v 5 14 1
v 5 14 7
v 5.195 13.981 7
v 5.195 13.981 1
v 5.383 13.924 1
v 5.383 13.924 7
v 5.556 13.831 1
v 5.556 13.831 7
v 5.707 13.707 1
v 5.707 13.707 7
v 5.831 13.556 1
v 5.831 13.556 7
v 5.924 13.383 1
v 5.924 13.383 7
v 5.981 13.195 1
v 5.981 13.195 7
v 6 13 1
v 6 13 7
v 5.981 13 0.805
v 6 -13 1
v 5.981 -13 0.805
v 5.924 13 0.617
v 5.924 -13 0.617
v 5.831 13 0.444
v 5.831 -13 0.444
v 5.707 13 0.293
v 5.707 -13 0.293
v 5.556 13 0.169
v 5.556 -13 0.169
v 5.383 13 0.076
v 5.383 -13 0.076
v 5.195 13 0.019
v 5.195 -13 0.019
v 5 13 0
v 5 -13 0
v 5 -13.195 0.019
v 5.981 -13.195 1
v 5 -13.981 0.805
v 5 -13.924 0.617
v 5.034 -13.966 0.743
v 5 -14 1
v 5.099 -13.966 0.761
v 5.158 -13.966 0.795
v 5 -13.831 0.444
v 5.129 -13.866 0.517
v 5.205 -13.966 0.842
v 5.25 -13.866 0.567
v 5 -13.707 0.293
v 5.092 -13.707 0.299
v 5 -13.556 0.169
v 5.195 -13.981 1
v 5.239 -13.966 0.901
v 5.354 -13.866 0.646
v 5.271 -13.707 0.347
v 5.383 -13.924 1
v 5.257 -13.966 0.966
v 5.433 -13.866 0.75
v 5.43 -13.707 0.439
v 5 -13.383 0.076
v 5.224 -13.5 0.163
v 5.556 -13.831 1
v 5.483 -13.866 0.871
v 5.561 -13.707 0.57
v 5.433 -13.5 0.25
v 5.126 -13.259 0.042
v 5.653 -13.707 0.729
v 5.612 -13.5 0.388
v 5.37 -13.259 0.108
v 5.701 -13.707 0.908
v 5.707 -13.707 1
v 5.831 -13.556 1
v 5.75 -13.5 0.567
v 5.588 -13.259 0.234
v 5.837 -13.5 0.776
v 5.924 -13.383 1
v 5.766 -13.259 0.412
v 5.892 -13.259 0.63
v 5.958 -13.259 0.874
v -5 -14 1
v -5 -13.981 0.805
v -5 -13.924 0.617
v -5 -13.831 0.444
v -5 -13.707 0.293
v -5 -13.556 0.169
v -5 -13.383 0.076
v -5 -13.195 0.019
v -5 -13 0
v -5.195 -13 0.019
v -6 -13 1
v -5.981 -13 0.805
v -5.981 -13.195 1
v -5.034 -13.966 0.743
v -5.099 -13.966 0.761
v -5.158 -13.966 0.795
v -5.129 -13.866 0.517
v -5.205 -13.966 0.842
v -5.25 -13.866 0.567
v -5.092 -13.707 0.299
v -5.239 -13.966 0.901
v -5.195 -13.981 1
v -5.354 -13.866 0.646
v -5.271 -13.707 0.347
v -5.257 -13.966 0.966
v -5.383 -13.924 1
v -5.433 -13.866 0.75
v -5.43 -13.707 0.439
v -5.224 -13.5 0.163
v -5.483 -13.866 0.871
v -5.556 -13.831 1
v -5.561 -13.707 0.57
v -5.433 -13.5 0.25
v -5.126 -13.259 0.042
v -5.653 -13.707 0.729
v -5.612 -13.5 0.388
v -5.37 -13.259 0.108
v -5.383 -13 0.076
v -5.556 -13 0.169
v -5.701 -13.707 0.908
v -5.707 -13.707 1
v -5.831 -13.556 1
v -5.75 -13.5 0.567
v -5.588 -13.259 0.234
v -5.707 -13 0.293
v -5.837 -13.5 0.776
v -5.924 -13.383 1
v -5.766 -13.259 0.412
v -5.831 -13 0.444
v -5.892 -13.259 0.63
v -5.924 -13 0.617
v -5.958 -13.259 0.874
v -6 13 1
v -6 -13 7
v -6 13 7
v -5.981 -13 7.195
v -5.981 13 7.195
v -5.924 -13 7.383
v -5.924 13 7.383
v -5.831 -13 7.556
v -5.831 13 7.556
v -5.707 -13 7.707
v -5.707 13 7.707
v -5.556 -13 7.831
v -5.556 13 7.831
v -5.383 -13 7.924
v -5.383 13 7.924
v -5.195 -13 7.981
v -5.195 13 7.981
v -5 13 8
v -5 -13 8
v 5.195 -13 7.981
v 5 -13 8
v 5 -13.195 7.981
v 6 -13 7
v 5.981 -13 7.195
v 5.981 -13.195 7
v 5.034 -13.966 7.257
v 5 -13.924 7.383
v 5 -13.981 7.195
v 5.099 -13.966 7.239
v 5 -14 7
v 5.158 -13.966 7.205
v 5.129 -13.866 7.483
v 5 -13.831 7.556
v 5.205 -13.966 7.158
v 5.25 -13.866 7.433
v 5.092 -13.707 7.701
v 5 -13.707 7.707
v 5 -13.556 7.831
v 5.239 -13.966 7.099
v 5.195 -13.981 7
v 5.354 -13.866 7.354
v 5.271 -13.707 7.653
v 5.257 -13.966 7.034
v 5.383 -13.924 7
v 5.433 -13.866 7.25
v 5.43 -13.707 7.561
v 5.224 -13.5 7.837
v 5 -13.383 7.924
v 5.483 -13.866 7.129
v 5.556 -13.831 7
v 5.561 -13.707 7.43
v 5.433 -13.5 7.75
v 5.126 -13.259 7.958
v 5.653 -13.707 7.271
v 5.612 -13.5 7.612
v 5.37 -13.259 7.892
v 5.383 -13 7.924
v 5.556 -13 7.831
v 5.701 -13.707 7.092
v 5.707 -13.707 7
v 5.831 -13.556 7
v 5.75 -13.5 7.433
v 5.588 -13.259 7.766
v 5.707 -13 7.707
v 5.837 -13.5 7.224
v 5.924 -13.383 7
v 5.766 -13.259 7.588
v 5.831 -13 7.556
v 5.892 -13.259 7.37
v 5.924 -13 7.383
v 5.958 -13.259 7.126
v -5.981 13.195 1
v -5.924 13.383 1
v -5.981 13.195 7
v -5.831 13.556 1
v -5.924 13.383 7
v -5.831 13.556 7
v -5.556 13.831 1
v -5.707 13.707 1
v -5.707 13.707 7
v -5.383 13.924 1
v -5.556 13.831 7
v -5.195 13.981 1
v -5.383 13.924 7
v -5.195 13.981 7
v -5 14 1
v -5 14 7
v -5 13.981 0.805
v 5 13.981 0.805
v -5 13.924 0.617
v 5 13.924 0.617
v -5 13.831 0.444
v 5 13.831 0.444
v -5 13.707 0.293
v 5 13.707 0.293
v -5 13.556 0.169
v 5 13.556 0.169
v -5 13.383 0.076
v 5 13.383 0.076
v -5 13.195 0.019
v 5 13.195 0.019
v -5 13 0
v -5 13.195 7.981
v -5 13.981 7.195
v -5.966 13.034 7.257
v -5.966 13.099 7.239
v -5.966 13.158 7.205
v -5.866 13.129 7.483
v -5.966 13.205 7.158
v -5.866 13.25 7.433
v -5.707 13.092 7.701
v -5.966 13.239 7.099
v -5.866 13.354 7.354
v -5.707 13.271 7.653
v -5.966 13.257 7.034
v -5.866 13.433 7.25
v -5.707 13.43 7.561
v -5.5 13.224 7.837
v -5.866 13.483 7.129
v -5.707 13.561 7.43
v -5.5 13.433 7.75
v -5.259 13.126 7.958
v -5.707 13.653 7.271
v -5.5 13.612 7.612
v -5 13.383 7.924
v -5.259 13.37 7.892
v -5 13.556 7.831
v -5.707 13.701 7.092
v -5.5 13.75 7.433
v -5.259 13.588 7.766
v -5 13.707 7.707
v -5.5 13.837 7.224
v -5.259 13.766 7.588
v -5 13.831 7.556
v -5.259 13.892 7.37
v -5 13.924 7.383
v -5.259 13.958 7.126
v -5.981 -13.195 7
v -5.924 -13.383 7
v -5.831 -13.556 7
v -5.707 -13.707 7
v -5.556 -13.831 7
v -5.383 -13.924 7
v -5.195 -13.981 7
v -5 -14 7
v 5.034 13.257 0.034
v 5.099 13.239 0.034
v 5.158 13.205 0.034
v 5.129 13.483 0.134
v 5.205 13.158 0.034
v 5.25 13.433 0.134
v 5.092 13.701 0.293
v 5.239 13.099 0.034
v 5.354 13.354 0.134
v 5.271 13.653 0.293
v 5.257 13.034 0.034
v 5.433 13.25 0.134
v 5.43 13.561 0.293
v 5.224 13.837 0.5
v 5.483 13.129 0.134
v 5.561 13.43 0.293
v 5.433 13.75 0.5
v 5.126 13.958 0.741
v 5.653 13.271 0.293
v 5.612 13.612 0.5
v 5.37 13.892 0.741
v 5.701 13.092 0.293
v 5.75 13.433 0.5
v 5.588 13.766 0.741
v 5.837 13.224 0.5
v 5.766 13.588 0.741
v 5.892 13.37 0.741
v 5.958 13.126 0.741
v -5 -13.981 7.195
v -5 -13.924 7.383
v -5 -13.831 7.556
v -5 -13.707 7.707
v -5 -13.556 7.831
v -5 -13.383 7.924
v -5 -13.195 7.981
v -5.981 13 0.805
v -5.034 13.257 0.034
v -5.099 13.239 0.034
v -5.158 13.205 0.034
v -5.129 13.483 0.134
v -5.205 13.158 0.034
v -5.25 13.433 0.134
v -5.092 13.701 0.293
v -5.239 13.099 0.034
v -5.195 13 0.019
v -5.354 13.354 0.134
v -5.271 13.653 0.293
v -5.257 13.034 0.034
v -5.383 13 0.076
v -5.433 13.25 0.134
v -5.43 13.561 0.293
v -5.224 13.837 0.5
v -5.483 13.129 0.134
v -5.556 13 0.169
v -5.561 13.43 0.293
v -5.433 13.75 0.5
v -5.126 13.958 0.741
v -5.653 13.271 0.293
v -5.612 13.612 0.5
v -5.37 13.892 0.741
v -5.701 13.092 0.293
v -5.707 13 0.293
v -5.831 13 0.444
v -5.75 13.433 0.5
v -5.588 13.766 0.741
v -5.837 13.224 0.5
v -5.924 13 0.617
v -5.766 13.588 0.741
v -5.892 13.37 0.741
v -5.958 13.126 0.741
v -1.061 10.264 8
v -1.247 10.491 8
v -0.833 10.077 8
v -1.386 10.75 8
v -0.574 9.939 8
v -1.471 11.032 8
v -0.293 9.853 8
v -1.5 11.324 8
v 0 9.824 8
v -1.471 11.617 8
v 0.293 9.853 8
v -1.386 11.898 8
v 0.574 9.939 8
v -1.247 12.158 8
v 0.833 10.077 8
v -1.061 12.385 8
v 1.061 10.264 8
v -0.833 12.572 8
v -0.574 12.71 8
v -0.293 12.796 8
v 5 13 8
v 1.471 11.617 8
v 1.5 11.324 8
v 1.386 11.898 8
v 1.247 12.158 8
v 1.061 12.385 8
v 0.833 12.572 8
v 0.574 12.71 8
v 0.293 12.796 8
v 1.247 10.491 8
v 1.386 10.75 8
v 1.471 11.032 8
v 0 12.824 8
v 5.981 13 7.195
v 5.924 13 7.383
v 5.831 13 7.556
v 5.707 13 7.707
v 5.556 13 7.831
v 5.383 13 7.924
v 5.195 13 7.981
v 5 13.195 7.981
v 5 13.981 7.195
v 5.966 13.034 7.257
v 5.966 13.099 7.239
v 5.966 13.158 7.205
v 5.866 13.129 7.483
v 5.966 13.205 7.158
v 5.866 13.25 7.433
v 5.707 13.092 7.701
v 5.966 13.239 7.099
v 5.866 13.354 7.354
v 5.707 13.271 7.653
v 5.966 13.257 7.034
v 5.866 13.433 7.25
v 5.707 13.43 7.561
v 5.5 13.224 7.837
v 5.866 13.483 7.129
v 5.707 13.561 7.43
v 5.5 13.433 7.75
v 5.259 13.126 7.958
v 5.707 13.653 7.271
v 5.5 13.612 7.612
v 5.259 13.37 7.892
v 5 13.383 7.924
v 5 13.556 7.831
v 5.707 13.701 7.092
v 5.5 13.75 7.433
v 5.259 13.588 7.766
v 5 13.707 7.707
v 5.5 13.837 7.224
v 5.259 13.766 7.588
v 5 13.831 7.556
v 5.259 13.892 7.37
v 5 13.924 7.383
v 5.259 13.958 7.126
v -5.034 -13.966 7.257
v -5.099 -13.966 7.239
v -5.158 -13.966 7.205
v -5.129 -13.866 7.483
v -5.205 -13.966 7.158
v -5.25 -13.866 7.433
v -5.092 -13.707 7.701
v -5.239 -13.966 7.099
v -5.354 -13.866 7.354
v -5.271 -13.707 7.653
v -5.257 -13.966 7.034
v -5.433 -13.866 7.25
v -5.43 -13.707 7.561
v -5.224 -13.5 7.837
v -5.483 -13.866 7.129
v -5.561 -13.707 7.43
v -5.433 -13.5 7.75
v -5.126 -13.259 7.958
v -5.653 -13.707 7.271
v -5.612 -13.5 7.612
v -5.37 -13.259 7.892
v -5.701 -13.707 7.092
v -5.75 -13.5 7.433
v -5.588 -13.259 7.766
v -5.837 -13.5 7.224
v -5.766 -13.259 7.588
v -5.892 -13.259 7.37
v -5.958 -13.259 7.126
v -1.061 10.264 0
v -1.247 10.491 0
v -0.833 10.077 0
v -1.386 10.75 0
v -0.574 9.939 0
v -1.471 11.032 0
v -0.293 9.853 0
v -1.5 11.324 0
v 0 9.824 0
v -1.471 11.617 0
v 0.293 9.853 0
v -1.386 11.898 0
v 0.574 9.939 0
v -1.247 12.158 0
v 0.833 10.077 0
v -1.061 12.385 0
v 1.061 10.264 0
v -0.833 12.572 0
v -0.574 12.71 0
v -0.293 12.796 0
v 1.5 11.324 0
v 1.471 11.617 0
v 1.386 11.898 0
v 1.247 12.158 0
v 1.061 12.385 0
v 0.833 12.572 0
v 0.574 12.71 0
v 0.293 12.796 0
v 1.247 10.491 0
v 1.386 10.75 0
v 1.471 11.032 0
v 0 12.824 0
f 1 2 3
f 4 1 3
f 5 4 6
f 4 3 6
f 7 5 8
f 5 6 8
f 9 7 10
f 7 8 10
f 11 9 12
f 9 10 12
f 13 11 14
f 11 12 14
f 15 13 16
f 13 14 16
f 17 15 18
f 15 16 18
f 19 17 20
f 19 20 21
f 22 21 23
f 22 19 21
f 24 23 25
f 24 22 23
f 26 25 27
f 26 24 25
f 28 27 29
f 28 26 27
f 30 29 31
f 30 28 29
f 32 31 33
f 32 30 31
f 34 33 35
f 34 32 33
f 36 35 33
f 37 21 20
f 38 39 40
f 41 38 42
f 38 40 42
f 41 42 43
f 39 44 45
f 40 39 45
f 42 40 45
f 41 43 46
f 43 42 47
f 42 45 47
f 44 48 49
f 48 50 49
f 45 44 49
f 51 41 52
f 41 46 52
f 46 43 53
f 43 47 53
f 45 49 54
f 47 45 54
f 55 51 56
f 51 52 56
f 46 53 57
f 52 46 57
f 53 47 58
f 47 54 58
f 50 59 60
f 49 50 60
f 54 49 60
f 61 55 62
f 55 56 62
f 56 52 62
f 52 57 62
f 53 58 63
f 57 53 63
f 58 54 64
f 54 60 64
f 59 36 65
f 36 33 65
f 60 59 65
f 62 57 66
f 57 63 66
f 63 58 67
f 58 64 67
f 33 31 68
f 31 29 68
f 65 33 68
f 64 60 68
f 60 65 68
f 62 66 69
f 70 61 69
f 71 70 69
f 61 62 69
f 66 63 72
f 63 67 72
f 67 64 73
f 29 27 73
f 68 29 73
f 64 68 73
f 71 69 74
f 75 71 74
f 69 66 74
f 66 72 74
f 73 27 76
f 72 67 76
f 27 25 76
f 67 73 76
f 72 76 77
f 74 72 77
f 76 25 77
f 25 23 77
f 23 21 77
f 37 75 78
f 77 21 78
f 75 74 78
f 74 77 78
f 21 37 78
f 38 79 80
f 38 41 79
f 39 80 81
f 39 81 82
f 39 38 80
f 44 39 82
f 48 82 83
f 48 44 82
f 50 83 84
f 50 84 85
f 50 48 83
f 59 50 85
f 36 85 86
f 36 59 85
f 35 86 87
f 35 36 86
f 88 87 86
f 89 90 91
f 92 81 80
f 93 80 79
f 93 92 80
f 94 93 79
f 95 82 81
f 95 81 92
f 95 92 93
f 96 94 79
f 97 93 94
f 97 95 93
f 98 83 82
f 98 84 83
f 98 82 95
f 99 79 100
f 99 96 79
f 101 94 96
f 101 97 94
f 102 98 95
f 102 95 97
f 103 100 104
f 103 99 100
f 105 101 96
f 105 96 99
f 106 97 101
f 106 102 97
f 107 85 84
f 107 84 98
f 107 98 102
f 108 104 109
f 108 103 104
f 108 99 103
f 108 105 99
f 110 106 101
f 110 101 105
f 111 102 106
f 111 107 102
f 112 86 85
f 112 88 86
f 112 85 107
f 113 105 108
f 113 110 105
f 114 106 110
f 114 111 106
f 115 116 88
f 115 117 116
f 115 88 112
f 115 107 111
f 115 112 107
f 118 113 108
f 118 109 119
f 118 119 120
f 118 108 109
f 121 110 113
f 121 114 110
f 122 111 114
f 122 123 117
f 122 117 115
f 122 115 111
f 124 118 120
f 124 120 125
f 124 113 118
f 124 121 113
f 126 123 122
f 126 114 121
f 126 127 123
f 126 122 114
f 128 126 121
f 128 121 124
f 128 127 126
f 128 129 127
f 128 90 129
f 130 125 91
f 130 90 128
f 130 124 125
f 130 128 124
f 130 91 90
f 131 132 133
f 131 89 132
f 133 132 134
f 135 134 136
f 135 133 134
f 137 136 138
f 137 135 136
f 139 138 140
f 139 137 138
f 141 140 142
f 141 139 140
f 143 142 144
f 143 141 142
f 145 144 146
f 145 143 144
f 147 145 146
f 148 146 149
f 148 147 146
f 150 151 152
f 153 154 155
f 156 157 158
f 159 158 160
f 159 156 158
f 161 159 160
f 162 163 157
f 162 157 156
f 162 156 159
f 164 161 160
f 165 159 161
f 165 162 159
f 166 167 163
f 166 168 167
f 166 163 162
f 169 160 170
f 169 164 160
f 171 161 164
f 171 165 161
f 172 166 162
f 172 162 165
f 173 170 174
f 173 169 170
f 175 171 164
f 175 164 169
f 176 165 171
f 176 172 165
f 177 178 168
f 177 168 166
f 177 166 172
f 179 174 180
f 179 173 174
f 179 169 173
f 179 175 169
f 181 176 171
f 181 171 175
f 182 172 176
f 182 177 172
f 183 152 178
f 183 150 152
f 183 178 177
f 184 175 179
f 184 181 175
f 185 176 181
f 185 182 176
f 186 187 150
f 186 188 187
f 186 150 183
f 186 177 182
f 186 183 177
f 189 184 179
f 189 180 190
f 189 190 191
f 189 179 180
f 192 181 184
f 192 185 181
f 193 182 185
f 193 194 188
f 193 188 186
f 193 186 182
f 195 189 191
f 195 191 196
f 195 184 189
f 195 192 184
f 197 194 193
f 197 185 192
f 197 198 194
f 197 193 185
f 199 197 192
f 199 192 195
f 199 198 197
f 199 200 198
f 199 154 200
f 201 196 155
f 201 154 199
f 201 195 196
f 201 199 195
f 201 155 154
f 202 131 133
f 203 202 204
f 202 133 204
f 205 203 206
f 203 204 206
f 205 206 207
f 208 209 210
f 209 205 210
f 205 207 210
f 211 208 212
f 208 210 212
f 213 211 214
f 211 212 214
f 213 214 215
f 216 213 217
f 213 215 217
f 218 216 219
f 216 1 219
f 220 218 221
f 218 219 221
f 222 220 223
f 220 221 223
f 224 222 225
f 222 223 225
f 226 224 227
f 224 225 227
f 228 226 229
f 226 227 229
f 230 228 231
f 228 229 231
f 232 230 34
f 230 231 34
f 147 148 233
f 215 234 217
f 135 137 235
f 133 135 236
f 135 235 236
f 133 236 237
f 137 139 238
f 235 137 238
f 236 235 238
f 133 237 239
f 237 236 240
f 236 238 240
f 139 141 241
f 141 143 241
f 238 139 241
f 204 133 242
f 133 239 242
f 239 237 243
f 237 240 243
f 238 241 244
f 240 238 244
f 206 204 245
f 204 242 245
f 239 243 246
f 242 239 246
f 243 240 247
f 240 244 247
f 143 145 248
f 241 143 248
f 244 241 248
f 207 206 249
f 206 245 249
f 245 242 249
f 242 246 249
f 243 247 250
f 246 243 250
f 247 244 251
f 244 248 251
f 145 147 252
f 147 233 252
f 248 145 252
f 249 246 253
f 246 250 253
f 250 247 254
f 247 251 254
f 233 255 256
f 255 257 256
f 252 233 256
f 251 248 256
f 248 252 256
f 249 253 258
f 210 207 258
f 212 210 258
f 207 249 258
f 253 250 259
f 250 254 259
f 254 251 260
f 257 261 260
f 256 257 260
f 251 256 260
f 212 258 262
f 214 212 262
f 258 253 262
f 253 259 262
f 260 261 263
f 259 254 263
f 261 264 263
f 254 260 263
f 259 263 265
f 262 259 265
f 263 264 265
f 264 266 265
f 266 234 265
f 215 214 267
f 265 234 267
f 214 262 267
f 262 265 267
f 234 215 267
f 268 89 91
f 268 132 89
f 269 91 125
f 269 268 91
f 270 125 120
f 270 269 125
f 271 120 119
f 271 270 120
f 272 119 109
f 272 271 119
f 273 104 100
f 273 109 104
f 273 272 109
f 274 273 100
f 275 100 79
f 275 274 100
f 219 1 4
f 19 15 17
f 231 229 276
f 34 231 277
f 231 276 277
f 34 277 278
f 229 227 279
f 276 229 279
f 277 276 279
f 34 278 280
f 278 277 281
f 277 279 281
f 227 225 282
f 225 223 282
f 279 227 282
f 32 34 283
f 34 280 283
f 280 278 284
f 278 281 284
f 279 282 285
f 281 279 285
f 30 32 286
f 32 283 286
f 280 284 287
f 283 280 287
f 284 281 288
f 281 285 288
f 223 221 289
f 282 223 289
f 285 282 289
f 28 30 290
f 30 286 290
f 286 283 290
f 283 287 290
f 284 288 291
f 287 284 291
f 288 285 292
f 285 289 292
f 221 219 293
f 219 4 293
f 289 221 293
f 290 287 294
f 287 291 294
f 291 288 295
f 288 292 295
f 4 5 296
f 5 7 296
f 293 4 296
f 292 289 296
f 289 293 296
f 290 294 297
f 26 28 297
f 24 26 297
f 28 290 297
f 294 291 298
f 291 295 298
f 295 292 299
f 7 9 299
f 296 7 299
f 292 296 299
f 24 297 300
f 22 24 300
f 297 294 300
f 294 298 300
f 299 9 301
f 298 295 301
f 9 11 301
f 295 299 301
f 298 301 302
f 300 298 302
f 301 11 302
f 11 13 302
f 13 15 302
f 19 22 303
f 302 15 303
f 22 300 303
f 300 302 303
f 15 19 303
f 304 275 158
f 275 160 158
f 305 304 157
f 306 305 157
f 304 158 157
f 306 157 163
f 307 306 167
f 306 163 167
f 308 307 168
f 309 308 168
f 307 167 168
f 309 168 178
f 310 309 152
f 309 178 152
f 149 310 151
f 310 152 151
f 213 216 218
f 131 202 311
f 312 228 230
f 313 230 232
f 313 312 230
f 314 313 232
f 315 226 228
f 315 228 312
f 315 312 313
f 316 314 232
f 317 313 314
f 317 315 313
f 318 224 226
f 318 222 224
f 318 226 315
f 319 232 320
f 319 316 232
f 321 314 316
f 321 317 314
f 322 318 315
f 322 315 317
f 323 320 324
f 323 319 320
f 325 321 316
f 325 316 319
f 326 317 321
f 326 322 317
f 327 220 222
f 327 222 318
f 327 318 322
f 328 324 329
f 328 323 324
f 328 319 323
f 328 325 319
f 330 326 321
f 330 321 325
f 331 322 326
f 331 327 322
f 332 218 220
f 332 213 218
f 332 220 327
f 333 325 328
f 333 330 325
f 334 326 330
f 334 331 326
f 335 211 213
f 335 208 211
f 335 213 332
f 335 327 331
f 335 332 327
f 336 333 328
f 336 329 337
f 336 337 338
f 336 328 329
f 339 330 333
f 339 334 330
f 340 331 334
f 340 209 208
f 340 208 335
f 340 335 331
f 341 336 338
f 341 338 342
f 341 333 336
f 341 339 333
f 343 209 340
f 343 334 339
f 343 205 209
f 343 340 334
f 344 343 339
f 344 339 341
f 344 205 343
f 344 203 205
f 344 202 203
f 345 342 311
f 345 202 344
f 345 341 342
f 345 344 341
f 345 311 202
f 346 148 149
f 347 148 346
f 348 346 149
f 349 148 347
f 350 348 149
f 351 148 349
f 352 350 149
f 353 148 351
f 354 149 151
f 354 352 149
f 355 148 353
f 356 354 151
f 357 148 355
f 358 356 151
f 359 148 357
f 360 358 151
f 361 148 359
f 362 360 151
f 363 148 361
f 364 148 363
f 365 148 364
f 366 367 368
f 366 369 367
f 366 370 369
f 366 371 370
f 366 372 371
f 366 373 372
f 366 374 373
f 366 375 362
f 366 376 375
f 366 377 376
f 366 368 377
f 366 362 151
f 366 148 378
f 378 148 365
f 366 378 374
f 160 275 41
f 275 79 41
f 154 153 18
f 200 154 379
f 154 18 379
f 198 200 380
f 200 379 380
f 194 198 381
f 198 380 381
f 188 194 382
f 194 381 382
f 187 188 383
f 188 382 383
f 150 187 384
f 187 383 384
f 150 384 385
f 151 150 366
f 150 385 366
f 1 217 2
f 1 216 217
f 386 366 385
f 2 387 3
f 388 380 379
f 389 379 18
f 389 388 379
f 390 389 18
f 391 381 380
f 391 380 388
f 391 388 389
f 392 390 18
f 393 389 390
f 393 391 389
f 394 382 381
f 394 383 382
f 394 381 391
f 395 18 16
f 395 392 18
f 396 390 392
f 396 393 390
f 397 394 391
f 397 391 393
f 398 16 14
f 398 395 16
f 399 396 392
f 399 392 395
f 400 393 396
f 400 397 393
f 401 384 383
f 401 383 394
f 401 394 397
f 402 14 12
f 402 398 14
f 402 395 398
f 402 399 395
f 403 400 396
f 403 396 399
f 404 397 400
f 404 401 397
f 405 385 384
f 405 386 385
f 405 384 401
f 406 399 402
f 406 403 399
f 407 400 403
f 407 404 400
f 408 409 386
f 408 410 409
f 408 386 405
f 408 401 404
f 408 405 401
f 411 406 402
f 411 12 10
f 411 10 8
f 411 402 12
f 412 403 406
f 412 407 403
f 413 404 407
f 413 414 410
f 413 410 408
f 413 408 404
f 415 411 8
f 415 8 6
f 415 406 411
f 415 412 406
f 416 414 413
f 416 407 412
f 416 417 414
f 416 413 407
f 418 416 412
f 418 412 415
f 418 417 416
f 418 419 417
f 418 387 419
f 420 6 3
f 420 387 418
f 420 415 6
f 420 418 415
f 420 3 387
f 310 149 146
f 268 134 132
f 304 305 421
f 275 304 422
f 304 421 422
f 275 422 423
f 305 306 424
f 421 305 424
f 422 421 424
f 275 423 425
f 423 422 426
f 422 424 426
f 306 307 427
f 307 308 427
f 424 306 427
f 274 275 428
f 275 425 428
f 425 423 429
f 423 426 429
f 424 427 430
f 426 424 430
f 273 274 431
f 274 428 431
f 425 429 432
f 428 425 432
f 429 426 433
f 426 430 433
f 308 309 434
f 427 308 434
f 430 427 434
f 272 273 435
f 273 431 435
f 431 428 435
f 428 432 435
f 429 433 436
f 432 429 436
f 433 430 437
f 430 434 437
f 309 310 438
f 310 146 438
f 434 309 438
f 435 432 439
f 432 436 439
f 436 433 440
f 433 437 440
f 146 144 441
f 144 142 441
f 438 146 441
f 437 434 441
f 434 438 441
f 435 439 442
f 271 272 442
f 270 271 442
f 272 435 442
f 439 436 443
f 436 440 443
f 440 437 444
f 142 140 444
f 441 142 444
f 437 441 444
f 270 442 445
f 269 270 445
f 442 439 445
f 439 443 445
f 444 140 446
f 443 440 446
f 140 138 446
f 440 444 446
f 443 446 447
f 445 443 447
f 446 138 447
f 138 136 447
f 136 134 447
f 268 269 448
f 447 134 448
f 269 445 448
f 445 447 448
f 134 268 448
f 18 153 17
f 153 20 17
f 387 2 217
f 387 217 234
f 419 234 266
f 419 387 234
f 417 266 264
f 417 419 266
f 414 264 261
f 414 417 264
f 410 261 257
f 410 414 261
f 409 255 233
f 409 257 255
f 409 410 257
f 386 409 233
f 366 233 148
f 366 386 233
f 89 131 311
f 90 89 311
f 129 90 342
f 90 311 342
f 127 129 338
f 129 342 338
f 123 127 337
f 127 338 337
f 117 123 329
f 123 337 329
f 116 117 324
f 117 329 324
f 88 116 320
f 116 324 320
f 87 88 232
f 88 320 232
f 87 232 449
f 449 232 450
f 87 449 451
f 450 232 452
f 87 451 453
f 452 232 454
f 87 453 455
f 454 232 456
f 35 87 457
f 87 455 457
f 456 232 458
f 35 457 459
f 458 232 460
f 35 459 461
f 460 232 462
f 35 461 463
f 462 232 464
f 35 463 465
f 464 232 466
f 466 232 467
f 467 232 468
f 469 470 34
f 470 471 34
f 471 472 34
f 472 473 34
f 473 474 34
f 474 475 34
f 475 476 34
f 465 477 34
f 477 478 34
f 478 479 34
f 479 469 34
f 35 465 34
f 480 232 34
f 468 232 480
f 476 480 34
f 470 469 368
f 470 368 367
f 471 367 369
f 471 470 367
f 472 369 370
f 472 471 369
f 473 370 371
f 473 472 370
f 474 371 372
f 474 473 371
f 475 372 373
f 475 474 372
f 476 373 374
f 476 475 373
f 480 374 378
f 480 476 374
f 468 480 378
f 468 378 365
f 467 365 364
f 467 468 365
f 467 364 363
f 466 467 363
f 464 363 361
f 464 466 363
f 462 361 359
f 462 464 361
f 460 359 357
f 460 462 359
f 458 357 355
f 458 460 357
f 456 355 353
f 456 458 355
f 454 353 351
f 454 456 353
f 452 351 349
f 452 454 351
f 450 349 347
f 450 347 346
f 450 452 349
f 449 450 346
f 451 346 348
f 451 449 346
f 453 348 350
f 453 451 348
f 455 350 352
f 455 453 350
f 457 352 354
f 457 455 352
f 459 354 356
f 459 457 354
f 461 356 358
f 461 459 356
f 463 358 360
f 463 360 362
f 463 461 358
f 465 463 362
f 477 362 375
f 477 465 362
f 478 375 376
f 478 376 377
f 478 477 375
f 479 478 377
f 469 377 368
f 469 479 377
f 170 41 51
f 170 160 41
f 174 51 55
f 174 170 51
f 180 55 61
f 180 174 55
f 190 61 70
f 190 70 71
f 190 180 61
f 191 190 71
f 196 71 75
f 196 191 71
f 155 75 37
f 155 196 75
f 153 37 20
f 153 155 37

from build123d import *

# Parameters (mm, degrees)
F0_W     = 12
F0_H     = 28
F0_R     = 1.5
F1_DEPTH = 8
F2_R     = 1


with BuildPart() as f1:
    # F0 (on Top) → F1 (new body)
    with BuildSketch(Plane.XY):
        Rectangle(F0_W, F0_H)
        with Locations((0, 11.324412)):
            Circle(F0_R, mode=Mode.SUBTRACT)
    extrude(amount=F1_DEPTH)

    # F2
    f2_edges = [f1.edges().sort_by_distance(p)[0] for p in [
        (0, 14, 8),
        (6, 0, 8),
        (-6, 0, 8),
        (0, -14, 8),
        (6, 14, 4),
        (-6, 14, 4),
        (0, 14, 0),
        (6, 0, 0),
        (-6, 0, 0),
        (0, -14, 0),
        (6, -14, 4),
        (-6, -14, 4),
    ]]
    fillet(f2_edges, radius=F2_R)


solid = f1.part
